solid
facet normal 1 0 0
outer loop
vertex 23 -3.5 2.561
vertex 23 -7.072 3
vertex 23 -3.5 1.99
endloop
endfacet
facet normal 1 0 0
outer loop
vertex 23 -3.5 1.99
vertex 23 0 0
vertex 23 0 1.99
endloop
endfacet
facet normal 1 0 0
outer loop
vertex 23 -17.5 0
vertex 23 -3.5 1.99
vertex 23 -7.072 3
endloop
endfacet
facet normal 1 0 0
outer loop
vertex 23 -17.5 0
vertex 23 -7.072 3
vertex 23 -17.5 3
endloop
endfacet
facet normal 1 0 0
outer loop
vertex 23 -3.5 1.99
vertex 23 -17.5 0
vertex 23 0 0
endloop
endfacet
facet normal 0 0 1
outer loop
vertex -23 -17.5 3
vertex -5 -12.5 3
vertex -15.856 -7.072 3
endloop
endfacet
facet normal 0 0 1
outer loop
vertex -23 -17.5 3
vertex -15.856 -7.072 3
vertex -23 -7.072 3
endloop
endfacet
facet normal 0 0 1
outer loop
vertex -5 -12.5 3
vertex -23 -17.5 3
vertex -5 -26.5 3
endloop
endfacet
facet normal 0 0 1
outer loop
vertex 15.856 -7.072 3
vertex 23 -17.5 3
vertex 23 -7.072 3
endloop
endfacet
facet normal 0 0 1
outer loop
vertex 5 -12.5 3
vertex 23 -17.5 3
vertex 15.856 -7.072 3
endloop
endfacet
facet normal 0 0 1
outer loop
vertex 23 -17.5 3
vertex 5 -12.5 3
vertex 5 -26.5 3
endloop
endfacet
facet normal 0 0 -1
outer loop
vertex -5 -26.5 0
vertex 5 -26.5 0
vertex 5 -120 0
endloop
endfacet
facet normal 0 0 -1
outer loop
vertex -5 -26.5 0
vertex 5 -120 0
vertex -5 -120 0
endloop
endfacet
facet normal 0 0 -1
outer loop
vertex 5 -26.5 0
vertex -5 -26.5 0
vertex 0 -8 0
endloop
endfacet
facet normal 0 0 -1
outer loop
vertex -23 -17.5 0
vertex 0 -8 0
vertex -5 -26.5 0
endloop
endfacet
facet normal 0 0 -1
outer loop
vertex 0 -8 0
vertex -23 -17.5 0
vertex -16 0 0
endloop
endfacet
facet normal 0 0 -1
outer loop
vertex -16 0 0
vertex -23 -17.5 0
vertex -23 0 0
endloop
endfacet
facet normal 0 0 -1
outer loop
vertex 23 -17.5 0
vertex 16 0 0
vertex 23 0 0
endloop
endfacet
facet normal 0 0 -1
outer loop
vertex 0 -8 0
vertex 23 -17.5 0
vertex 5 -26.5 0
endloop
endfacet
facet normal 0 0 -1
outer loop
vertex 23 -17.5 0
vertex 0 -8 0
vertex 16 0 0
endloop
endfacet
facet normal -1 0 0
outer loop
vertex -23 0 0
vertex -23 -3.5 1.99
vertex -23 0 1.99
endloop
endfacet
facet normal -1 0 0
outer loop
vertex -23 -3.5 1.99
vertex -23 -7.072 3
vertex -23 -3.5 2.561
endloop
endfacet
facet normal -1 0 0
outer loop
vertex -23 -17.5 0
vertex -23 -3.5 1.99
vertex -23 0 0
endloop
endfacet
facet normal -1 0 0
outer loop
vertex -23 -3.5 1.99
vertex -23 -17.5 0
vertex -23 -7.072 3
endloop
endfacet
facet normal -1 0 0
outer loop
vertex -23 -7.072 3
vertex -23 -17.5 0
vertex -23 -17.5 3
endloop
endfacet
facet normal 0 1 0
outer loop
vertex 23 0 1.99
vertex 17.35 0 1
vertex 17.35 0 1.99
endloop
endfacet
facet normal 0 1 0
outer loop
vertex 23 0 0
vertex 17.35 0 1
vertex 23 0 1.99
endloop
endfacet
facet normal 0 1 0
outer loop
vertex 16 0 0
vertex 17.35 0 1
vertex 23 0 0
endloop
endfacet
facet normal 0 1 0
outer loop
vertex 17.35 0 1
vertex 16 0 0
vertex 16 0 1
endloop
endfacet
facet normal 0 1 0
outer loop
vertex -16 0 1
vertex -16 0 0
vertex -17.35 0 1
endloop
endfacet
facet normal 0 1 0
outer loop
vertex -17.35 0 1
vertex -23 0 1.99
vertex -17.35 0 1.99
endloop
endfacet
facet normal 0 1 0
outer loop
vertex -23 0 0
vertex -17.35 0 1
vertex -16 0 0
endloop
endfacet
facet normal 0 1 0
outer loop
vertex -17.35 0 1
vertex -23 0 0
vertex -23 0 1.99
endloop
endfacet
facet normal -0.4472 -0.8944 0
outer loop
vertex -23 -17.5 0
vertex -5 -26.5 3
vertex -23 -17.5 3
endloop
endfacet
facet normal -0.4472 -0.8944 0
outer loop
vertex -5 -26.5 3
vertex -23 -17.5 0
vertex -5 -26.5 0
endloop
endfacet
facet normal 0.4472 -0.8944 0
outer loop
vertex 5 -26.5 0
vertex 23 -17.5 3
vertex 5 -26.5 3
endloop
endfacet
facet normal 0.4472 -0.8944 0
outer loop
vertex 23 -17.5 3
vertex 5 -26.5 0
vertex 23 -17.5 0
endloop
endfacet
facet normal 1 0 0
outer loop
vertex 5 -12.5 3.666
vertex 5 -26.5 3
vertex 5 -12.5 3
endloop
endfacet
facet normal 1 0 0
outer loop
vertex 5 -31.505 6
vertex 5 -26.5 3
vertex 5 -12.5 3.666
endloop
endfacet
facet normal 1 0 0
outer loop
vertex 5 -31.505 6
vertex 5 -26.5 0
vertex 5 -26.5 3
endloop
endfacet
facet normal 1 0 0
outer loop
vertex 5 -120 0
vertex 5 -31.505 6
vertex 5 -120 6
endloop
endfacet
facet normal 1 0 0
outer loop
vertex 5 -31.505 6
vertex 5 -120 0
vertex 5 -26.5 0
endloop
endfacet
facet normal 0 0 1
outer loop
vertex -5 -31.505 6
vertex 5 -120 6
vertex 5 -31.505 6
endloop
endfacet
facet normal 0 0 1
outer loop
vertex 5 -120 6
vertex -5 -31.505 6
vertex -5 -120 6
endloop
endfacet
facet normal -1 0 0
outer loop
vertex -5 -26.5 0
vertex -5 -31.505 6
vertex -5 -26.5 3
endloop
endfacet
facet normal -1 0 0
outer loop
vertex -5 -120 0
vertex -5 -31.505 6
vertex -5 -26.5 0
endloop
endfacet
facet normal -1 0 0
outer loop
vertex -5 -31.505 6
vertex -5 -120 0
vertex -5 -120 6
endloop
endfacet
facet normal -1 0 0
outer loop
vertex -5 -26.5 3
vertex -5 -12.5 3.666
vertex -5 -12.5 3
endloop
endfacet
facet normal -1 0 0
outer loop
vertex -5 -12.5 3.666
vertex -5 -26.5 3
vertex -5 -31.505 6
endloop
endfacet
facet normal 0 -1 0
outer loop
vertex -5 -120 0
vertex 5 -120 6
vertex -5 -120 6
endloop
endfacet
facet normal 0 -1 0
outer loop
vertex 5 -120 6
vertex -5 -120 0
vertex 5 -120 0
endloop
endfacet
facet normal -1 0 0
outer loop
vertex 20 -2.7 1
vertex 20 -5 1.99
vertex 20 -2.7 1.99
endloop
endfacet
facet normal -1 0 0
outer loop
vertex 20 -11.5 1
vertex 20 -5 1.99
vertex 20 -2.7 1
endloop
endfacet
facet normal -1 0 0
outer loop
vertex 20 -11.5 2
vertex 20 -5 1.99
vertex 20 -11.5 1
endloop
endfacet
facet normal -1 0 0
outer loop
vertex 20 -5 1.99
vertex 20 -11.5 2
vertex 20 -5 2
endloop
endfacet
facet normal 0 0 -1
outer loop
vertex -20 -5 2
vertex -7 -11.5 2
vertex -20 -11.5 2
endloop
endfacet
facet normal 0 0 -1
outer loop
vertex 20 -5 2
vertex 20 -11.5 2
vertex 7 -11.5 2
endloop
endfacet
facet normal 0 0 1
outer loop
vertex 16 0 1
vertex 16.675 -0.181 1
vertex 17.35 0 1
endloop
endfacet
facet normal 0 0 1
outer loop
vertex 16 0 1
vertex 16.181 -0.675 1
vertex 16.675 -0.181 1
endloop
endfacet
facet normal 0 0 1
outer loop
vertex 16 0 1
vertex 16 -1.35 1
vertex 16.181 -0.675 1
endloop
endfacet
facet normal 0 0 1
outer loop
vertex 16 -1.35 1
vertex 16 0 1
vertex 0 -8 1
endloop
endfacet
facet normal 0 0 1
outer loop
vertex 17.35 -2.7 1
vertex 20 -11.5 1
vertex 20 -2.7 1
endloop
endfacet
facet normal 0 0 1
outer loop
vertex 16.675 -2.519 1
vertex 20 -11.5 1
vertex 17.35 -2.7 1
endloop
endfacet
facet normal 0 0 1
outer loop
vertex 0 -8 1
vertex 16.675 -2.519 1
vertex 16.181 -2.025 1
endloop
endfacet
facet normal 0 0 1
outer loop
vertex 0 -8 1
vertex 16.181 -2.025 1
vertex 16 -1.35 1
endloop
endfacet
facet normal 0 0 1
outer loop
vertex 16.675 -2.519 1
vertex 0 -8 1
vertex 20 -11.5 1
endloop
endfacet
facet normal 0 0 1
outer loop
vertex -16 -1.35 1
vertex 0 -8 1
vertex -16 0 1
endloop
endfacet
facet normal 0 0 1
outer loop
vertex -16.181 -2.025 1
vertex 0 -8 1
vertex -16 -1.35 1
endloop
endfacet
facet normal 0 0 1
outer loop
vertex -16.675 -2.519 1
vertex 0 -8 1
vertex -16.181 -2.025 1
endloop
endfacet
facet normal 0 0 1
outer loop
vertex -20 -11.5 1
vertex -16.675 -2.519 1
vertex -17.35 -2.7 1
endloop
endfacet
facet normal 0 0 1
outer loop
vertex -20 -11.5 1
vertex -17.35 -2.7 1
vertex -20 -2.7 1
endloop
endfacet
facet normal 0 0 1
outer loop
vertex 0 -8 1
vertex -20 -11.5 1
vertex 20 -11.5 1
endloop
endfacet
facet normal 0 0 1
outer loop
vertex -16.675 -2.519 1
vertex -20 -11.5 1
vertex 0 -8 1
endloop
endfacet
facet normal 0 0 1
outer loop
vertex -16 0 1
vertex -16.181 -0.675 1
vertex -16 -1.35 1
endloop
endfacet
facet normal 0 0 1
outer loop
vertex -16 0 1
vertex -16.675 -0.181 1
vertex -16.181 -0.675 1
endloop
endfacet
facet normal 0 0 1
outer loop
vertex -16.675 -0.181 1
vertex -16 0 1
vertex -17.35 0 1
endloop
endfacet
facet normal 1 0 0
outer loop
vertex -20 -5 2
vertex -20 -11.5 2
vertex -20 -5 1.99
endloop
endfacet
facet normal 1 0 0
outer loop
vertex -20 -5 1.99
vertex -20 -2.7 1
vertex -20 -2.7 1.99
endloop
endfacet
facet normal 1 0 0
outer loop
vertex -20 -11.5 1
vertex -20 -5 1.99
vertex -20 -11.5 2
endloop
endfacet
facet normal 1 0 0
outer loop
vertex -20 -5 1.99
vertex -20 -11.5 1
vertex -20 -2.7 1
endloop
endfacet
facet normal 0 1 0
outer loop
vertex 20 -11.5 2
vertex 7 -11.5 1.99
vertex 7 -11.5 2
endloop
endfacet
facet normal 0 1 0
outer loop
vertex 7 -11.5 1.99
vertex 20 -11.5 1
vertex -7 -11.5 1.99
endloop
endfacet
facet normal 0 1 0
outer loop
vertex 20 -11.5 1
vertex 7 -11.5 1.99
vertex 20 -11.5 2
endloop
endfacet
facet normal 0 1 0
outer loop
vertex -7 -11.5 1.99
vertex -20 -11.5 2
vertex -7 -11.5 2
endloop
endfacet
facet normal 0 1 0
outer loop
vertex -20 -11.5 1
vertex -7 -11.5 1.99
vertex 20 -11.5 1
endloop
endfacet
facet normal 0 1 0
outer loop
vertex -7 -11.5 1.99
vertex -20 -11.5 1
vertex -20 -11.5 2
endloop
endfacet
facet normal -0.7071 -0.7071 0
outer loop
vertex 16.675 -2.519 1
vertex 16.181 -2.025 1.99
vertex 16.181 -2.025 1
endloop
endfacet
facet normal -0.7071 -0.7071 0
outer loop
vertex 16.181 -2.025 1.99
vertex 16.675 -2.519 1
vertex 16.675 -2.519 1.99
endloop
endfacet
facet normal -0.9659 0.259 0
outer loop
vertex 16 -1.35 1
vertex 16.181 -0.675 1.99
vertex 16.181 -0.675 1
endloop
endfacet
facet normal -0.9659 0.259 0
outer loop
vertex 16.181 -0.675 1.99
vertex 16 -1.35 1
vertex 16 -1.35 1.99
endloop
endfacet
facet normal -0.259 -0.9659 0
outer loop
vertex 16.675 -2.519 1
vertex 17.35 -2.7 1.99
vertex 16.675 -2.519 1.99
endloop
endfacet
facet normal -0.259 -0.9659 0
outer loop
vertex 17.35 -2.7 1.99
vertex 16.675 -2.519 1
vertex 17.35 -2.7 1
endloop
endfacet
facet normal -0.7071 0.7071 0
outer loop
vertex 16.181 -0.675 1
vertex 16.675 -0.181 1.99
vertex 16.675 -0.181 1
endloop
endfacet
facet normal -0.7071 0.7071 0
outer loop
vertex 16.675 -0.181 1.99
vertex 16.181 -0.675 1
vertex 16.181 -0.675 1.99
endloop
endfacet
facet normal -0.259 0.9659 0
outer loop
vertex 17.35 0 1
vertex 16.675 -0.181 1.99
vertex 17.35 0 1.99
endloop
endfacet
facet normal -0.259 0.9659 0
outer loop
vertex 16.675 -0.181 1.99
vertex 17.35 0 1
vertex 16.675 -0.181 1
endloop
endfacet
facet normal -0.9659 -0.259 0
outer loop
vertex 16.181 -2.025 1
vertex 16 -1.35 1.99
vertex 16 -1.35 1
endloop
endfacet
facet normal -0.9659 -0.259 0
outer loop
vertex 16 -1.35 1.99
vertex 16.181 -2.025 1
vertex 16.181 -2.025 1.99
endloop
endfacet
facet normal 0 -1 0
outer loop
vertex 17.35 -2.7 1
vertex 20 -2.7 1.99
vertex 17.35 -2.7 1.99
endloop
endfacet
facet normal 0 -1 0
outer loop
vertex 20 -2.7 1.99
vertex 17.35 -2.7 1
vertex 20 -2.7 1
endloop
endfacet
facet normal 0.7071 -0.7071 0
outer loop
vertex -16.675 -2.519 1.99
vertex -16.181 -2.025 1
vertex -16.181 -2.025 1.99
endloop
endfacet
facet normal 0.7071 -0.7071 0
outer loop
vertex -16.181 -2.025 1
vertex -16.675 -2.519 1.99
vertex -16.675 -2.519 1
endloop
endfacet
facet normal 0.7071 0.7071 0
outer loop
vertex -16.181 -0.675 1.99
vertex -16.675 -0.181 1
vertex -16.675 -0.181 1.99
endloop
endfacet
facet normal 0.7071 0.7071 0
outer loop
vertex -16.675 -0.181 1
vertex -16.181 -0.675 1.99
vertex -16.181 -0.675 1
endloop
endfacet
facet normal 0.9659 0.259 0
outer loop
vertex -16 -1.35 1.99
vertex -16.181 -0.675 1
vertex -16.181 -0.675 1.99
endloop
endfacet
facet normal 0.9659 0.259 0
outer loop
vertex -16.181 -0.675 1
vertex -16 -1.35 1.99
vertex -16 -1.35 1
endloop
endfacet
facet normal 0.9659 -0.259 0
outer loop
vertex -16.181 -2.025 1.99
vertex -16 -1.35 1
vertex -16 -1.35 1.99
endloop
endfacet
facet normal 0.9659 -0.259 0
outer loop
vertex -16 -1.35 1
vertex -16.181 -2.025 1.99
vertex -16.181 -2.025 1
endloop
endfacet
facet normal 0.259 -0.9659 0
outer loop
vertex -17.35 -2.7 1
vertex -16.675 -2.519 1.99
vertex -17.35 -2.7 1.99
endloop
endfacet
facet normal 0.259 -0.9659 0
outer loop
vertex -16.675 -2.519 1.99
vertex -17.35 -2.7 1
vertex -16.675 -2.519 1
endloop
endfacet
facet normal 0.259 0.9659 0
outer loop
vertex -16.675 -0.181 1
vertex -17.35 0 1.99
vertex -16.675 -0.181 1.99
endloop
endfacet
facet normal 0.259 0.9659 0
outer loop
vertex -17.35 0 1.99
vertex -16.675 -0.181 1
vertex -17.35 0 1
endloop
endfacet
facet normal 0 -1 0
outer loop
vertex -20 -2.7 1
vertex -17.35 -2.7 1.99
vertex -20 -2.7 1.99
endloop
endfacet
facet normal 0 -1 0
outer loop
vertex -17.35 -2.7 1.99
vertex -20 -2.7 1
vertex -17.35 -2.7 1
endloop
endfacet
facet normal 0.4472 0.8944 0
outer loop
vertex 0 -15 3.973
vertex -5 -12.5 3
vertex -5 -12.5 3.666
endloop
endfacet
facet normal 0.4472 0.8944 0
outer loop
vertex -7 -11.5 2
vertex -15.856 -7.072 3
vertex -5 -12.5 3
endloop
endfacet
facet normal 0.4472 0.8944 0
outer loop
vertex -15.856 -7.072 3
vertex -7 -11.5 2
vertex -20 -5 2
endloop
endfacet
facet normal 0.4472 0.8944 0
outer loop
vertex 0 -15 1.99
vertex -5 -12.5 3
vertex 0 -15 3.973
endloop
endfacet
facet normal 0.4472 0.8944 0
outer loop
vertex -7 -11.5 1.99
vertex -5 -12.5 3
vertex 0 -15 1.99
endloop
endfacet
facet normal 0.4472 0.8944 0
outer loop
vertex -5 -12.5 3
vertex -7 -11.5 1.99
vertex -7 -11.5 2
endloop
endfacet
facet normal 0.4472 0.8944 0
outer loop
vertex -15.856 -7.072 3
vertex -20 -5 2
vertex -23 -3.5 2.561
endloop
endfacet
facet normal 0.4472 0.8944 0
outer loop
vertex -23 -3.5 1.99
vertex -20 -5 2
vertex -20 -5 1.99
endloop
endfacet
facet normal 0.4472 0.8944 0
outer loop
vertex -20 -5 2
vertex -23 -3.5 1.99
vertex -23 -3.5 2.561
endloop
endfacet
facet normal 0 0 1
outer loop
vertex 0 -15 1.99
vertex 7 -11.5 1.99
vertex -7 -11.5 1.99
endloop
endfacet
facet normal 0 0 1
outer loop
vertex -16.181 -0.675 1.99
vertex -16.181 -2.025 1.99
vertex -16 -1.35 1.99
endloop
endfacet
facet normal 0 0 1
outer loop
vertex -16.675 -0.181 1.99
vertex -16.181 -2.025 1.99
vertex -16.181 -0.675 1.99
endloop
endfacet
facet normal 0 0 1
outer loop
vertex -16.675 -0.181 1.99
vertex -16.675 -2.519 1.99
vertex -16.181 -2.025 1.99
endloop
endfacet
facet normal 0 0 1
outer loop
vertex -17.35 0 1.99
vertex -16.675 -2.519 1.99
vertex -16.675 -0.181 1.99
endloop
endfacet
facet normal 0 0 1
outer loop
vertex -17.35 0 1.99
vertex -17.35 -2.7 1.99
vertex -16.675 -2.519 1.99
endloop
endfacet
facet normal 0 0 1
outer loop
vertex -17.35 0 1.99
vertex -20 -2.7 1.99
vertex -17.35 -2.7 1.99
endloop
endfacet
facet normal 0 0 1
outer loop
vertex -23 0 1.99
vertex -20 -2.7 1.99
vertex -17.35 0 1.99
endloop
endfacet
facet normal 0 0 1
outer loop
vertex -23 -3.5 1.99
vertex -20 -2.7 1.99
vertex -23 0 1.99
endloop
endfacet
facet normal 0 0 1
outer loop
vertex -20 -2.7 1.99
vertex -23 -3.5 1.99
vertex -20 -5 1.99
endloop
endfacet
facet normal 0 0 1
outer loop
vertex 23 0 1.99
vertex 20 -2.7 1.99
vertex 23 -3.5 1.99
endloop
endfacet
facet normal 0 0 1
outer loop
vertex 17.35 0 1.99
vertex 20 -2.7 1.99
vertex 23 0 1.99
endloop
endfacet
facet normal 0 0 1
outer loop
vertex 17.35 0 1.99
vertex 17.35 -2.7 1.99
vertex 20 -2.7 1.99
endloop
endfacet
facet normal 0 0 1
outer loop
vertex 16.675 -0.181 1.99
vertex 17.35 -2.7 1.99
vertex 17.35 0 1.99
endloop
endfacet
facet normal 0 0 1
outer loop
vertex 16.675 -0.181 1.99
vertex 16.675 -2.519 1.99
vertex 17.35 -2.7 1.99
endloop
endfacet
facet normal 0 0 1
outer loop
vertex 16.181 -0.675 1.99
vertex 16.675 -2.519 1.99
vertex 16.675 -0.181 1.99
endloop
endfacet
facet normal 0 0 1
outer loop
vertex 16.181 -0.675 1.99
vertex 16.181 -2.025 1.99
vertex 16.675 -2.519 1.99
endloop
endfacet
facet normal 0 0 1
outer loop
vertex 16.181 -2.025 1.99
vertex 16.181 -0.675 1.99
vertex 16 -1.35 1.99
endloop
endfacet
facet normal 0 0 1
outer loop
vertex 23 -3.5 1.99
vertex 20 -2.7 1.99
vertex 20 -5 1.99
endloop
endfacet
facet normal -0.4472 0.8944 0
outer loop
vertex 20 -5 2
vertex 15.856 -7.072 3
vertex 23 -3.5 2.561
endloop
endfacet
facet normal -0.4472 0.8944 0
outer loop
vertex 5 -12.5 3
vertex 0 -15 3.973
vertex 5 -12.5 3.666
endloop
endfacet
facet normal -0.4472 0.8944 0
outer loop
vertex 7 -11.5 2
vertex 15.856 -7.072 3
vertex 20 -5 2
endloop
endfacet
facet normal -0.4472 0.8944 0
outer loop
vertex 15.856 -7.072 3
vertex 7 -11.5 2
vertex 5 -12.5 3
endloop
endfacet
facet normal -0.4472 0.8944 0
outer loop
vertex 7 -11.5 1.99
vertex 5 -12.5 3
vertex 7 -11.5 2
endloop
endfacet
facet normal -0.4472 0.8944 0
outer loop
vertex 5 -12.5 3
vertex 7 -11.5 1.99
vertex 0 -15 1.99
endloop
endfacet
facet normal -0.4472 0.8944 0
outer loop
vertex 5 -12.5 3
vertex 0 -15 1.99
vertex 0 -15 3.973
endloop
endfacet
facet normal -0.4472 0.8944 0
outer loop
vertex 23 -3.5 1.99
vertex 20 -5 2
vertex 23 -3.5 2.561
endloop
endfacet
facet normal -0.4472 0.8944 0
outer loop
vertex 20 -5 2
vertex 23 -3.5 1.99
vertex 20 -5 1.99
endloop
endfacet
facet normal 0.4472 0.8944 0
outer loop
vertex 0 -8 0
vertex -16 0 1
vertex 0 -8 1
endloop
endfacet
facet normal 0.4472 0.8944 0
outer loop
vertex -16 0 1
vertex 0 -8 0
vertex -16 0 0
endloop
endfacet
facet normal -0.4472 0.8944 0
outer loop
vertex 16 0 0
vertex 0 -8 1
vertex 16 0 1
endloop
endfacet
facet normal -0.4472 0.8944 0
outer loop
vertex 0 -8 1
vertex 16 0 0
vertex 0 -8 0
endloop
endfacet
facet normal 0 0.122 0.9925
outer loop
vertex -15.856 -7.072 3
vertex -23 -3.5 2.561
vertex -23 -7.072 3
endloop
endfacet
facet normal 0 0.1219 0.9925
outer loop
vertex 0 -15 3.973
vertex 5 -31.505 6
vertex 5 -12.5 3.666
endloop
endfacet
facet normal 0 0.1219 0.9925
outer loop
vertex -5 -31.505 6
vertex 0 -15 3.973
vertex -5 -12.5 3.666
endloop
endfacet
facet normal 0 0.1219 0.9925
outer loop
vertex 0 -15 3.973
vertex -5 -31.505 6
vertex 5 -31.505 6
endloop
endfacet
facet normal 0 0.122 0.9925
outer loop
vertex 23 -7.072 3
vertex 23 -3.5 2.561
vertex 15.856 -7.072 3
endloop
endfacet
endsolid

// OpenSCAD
// Razor scraper

w=40;// width of razor
l=11.5;// length to stops
t=1;// thickness of razor
d=2.7;// diameter of stops
w1=4;// width of stops

difference(){
	union(){
		translate([0,-l/2-3,3/2])cube([w+6,l+6,3],center=true);
		translate([0,-l-6,1.5])scale([1,0.5,1])rotate([0,0,45])
			cube([(w+6)/sqrt(2),(w+6)/sqrt(2),3],center=true);
		translate([-5,-120,0])cube([10,110,6]);
	}
	difference(){
		translate([0,0,t/2+1])cube([w,2*l,t],center=true);
		translate([w/2-w1+d/2,-d/2,0])cylinder(r=d/2,h=3*t,$fn=12);
		translate([w/2-w1+d/2,-d,0])cube([2*w1,d,3*t]);
		translate([-(w/2-w1+d/2),-d/2,0])cylinder(r=d/2,h=3*t,$fn=12);
		translate([-w/2-w1-d/2,-d,0])cube([2*w1,d,3*t]);
	}
	translate([0,-15,2-0.01])scale([1,0.5,1])rotate([0,0,45])cube(2*w);
	translate([0,-8,-0.01])scale([1,0.5,1])rotate([0,0,45])cube(2*w);
	translate([-w,-3,2.5])rotate([83,0,0])cube(2*w);
}
